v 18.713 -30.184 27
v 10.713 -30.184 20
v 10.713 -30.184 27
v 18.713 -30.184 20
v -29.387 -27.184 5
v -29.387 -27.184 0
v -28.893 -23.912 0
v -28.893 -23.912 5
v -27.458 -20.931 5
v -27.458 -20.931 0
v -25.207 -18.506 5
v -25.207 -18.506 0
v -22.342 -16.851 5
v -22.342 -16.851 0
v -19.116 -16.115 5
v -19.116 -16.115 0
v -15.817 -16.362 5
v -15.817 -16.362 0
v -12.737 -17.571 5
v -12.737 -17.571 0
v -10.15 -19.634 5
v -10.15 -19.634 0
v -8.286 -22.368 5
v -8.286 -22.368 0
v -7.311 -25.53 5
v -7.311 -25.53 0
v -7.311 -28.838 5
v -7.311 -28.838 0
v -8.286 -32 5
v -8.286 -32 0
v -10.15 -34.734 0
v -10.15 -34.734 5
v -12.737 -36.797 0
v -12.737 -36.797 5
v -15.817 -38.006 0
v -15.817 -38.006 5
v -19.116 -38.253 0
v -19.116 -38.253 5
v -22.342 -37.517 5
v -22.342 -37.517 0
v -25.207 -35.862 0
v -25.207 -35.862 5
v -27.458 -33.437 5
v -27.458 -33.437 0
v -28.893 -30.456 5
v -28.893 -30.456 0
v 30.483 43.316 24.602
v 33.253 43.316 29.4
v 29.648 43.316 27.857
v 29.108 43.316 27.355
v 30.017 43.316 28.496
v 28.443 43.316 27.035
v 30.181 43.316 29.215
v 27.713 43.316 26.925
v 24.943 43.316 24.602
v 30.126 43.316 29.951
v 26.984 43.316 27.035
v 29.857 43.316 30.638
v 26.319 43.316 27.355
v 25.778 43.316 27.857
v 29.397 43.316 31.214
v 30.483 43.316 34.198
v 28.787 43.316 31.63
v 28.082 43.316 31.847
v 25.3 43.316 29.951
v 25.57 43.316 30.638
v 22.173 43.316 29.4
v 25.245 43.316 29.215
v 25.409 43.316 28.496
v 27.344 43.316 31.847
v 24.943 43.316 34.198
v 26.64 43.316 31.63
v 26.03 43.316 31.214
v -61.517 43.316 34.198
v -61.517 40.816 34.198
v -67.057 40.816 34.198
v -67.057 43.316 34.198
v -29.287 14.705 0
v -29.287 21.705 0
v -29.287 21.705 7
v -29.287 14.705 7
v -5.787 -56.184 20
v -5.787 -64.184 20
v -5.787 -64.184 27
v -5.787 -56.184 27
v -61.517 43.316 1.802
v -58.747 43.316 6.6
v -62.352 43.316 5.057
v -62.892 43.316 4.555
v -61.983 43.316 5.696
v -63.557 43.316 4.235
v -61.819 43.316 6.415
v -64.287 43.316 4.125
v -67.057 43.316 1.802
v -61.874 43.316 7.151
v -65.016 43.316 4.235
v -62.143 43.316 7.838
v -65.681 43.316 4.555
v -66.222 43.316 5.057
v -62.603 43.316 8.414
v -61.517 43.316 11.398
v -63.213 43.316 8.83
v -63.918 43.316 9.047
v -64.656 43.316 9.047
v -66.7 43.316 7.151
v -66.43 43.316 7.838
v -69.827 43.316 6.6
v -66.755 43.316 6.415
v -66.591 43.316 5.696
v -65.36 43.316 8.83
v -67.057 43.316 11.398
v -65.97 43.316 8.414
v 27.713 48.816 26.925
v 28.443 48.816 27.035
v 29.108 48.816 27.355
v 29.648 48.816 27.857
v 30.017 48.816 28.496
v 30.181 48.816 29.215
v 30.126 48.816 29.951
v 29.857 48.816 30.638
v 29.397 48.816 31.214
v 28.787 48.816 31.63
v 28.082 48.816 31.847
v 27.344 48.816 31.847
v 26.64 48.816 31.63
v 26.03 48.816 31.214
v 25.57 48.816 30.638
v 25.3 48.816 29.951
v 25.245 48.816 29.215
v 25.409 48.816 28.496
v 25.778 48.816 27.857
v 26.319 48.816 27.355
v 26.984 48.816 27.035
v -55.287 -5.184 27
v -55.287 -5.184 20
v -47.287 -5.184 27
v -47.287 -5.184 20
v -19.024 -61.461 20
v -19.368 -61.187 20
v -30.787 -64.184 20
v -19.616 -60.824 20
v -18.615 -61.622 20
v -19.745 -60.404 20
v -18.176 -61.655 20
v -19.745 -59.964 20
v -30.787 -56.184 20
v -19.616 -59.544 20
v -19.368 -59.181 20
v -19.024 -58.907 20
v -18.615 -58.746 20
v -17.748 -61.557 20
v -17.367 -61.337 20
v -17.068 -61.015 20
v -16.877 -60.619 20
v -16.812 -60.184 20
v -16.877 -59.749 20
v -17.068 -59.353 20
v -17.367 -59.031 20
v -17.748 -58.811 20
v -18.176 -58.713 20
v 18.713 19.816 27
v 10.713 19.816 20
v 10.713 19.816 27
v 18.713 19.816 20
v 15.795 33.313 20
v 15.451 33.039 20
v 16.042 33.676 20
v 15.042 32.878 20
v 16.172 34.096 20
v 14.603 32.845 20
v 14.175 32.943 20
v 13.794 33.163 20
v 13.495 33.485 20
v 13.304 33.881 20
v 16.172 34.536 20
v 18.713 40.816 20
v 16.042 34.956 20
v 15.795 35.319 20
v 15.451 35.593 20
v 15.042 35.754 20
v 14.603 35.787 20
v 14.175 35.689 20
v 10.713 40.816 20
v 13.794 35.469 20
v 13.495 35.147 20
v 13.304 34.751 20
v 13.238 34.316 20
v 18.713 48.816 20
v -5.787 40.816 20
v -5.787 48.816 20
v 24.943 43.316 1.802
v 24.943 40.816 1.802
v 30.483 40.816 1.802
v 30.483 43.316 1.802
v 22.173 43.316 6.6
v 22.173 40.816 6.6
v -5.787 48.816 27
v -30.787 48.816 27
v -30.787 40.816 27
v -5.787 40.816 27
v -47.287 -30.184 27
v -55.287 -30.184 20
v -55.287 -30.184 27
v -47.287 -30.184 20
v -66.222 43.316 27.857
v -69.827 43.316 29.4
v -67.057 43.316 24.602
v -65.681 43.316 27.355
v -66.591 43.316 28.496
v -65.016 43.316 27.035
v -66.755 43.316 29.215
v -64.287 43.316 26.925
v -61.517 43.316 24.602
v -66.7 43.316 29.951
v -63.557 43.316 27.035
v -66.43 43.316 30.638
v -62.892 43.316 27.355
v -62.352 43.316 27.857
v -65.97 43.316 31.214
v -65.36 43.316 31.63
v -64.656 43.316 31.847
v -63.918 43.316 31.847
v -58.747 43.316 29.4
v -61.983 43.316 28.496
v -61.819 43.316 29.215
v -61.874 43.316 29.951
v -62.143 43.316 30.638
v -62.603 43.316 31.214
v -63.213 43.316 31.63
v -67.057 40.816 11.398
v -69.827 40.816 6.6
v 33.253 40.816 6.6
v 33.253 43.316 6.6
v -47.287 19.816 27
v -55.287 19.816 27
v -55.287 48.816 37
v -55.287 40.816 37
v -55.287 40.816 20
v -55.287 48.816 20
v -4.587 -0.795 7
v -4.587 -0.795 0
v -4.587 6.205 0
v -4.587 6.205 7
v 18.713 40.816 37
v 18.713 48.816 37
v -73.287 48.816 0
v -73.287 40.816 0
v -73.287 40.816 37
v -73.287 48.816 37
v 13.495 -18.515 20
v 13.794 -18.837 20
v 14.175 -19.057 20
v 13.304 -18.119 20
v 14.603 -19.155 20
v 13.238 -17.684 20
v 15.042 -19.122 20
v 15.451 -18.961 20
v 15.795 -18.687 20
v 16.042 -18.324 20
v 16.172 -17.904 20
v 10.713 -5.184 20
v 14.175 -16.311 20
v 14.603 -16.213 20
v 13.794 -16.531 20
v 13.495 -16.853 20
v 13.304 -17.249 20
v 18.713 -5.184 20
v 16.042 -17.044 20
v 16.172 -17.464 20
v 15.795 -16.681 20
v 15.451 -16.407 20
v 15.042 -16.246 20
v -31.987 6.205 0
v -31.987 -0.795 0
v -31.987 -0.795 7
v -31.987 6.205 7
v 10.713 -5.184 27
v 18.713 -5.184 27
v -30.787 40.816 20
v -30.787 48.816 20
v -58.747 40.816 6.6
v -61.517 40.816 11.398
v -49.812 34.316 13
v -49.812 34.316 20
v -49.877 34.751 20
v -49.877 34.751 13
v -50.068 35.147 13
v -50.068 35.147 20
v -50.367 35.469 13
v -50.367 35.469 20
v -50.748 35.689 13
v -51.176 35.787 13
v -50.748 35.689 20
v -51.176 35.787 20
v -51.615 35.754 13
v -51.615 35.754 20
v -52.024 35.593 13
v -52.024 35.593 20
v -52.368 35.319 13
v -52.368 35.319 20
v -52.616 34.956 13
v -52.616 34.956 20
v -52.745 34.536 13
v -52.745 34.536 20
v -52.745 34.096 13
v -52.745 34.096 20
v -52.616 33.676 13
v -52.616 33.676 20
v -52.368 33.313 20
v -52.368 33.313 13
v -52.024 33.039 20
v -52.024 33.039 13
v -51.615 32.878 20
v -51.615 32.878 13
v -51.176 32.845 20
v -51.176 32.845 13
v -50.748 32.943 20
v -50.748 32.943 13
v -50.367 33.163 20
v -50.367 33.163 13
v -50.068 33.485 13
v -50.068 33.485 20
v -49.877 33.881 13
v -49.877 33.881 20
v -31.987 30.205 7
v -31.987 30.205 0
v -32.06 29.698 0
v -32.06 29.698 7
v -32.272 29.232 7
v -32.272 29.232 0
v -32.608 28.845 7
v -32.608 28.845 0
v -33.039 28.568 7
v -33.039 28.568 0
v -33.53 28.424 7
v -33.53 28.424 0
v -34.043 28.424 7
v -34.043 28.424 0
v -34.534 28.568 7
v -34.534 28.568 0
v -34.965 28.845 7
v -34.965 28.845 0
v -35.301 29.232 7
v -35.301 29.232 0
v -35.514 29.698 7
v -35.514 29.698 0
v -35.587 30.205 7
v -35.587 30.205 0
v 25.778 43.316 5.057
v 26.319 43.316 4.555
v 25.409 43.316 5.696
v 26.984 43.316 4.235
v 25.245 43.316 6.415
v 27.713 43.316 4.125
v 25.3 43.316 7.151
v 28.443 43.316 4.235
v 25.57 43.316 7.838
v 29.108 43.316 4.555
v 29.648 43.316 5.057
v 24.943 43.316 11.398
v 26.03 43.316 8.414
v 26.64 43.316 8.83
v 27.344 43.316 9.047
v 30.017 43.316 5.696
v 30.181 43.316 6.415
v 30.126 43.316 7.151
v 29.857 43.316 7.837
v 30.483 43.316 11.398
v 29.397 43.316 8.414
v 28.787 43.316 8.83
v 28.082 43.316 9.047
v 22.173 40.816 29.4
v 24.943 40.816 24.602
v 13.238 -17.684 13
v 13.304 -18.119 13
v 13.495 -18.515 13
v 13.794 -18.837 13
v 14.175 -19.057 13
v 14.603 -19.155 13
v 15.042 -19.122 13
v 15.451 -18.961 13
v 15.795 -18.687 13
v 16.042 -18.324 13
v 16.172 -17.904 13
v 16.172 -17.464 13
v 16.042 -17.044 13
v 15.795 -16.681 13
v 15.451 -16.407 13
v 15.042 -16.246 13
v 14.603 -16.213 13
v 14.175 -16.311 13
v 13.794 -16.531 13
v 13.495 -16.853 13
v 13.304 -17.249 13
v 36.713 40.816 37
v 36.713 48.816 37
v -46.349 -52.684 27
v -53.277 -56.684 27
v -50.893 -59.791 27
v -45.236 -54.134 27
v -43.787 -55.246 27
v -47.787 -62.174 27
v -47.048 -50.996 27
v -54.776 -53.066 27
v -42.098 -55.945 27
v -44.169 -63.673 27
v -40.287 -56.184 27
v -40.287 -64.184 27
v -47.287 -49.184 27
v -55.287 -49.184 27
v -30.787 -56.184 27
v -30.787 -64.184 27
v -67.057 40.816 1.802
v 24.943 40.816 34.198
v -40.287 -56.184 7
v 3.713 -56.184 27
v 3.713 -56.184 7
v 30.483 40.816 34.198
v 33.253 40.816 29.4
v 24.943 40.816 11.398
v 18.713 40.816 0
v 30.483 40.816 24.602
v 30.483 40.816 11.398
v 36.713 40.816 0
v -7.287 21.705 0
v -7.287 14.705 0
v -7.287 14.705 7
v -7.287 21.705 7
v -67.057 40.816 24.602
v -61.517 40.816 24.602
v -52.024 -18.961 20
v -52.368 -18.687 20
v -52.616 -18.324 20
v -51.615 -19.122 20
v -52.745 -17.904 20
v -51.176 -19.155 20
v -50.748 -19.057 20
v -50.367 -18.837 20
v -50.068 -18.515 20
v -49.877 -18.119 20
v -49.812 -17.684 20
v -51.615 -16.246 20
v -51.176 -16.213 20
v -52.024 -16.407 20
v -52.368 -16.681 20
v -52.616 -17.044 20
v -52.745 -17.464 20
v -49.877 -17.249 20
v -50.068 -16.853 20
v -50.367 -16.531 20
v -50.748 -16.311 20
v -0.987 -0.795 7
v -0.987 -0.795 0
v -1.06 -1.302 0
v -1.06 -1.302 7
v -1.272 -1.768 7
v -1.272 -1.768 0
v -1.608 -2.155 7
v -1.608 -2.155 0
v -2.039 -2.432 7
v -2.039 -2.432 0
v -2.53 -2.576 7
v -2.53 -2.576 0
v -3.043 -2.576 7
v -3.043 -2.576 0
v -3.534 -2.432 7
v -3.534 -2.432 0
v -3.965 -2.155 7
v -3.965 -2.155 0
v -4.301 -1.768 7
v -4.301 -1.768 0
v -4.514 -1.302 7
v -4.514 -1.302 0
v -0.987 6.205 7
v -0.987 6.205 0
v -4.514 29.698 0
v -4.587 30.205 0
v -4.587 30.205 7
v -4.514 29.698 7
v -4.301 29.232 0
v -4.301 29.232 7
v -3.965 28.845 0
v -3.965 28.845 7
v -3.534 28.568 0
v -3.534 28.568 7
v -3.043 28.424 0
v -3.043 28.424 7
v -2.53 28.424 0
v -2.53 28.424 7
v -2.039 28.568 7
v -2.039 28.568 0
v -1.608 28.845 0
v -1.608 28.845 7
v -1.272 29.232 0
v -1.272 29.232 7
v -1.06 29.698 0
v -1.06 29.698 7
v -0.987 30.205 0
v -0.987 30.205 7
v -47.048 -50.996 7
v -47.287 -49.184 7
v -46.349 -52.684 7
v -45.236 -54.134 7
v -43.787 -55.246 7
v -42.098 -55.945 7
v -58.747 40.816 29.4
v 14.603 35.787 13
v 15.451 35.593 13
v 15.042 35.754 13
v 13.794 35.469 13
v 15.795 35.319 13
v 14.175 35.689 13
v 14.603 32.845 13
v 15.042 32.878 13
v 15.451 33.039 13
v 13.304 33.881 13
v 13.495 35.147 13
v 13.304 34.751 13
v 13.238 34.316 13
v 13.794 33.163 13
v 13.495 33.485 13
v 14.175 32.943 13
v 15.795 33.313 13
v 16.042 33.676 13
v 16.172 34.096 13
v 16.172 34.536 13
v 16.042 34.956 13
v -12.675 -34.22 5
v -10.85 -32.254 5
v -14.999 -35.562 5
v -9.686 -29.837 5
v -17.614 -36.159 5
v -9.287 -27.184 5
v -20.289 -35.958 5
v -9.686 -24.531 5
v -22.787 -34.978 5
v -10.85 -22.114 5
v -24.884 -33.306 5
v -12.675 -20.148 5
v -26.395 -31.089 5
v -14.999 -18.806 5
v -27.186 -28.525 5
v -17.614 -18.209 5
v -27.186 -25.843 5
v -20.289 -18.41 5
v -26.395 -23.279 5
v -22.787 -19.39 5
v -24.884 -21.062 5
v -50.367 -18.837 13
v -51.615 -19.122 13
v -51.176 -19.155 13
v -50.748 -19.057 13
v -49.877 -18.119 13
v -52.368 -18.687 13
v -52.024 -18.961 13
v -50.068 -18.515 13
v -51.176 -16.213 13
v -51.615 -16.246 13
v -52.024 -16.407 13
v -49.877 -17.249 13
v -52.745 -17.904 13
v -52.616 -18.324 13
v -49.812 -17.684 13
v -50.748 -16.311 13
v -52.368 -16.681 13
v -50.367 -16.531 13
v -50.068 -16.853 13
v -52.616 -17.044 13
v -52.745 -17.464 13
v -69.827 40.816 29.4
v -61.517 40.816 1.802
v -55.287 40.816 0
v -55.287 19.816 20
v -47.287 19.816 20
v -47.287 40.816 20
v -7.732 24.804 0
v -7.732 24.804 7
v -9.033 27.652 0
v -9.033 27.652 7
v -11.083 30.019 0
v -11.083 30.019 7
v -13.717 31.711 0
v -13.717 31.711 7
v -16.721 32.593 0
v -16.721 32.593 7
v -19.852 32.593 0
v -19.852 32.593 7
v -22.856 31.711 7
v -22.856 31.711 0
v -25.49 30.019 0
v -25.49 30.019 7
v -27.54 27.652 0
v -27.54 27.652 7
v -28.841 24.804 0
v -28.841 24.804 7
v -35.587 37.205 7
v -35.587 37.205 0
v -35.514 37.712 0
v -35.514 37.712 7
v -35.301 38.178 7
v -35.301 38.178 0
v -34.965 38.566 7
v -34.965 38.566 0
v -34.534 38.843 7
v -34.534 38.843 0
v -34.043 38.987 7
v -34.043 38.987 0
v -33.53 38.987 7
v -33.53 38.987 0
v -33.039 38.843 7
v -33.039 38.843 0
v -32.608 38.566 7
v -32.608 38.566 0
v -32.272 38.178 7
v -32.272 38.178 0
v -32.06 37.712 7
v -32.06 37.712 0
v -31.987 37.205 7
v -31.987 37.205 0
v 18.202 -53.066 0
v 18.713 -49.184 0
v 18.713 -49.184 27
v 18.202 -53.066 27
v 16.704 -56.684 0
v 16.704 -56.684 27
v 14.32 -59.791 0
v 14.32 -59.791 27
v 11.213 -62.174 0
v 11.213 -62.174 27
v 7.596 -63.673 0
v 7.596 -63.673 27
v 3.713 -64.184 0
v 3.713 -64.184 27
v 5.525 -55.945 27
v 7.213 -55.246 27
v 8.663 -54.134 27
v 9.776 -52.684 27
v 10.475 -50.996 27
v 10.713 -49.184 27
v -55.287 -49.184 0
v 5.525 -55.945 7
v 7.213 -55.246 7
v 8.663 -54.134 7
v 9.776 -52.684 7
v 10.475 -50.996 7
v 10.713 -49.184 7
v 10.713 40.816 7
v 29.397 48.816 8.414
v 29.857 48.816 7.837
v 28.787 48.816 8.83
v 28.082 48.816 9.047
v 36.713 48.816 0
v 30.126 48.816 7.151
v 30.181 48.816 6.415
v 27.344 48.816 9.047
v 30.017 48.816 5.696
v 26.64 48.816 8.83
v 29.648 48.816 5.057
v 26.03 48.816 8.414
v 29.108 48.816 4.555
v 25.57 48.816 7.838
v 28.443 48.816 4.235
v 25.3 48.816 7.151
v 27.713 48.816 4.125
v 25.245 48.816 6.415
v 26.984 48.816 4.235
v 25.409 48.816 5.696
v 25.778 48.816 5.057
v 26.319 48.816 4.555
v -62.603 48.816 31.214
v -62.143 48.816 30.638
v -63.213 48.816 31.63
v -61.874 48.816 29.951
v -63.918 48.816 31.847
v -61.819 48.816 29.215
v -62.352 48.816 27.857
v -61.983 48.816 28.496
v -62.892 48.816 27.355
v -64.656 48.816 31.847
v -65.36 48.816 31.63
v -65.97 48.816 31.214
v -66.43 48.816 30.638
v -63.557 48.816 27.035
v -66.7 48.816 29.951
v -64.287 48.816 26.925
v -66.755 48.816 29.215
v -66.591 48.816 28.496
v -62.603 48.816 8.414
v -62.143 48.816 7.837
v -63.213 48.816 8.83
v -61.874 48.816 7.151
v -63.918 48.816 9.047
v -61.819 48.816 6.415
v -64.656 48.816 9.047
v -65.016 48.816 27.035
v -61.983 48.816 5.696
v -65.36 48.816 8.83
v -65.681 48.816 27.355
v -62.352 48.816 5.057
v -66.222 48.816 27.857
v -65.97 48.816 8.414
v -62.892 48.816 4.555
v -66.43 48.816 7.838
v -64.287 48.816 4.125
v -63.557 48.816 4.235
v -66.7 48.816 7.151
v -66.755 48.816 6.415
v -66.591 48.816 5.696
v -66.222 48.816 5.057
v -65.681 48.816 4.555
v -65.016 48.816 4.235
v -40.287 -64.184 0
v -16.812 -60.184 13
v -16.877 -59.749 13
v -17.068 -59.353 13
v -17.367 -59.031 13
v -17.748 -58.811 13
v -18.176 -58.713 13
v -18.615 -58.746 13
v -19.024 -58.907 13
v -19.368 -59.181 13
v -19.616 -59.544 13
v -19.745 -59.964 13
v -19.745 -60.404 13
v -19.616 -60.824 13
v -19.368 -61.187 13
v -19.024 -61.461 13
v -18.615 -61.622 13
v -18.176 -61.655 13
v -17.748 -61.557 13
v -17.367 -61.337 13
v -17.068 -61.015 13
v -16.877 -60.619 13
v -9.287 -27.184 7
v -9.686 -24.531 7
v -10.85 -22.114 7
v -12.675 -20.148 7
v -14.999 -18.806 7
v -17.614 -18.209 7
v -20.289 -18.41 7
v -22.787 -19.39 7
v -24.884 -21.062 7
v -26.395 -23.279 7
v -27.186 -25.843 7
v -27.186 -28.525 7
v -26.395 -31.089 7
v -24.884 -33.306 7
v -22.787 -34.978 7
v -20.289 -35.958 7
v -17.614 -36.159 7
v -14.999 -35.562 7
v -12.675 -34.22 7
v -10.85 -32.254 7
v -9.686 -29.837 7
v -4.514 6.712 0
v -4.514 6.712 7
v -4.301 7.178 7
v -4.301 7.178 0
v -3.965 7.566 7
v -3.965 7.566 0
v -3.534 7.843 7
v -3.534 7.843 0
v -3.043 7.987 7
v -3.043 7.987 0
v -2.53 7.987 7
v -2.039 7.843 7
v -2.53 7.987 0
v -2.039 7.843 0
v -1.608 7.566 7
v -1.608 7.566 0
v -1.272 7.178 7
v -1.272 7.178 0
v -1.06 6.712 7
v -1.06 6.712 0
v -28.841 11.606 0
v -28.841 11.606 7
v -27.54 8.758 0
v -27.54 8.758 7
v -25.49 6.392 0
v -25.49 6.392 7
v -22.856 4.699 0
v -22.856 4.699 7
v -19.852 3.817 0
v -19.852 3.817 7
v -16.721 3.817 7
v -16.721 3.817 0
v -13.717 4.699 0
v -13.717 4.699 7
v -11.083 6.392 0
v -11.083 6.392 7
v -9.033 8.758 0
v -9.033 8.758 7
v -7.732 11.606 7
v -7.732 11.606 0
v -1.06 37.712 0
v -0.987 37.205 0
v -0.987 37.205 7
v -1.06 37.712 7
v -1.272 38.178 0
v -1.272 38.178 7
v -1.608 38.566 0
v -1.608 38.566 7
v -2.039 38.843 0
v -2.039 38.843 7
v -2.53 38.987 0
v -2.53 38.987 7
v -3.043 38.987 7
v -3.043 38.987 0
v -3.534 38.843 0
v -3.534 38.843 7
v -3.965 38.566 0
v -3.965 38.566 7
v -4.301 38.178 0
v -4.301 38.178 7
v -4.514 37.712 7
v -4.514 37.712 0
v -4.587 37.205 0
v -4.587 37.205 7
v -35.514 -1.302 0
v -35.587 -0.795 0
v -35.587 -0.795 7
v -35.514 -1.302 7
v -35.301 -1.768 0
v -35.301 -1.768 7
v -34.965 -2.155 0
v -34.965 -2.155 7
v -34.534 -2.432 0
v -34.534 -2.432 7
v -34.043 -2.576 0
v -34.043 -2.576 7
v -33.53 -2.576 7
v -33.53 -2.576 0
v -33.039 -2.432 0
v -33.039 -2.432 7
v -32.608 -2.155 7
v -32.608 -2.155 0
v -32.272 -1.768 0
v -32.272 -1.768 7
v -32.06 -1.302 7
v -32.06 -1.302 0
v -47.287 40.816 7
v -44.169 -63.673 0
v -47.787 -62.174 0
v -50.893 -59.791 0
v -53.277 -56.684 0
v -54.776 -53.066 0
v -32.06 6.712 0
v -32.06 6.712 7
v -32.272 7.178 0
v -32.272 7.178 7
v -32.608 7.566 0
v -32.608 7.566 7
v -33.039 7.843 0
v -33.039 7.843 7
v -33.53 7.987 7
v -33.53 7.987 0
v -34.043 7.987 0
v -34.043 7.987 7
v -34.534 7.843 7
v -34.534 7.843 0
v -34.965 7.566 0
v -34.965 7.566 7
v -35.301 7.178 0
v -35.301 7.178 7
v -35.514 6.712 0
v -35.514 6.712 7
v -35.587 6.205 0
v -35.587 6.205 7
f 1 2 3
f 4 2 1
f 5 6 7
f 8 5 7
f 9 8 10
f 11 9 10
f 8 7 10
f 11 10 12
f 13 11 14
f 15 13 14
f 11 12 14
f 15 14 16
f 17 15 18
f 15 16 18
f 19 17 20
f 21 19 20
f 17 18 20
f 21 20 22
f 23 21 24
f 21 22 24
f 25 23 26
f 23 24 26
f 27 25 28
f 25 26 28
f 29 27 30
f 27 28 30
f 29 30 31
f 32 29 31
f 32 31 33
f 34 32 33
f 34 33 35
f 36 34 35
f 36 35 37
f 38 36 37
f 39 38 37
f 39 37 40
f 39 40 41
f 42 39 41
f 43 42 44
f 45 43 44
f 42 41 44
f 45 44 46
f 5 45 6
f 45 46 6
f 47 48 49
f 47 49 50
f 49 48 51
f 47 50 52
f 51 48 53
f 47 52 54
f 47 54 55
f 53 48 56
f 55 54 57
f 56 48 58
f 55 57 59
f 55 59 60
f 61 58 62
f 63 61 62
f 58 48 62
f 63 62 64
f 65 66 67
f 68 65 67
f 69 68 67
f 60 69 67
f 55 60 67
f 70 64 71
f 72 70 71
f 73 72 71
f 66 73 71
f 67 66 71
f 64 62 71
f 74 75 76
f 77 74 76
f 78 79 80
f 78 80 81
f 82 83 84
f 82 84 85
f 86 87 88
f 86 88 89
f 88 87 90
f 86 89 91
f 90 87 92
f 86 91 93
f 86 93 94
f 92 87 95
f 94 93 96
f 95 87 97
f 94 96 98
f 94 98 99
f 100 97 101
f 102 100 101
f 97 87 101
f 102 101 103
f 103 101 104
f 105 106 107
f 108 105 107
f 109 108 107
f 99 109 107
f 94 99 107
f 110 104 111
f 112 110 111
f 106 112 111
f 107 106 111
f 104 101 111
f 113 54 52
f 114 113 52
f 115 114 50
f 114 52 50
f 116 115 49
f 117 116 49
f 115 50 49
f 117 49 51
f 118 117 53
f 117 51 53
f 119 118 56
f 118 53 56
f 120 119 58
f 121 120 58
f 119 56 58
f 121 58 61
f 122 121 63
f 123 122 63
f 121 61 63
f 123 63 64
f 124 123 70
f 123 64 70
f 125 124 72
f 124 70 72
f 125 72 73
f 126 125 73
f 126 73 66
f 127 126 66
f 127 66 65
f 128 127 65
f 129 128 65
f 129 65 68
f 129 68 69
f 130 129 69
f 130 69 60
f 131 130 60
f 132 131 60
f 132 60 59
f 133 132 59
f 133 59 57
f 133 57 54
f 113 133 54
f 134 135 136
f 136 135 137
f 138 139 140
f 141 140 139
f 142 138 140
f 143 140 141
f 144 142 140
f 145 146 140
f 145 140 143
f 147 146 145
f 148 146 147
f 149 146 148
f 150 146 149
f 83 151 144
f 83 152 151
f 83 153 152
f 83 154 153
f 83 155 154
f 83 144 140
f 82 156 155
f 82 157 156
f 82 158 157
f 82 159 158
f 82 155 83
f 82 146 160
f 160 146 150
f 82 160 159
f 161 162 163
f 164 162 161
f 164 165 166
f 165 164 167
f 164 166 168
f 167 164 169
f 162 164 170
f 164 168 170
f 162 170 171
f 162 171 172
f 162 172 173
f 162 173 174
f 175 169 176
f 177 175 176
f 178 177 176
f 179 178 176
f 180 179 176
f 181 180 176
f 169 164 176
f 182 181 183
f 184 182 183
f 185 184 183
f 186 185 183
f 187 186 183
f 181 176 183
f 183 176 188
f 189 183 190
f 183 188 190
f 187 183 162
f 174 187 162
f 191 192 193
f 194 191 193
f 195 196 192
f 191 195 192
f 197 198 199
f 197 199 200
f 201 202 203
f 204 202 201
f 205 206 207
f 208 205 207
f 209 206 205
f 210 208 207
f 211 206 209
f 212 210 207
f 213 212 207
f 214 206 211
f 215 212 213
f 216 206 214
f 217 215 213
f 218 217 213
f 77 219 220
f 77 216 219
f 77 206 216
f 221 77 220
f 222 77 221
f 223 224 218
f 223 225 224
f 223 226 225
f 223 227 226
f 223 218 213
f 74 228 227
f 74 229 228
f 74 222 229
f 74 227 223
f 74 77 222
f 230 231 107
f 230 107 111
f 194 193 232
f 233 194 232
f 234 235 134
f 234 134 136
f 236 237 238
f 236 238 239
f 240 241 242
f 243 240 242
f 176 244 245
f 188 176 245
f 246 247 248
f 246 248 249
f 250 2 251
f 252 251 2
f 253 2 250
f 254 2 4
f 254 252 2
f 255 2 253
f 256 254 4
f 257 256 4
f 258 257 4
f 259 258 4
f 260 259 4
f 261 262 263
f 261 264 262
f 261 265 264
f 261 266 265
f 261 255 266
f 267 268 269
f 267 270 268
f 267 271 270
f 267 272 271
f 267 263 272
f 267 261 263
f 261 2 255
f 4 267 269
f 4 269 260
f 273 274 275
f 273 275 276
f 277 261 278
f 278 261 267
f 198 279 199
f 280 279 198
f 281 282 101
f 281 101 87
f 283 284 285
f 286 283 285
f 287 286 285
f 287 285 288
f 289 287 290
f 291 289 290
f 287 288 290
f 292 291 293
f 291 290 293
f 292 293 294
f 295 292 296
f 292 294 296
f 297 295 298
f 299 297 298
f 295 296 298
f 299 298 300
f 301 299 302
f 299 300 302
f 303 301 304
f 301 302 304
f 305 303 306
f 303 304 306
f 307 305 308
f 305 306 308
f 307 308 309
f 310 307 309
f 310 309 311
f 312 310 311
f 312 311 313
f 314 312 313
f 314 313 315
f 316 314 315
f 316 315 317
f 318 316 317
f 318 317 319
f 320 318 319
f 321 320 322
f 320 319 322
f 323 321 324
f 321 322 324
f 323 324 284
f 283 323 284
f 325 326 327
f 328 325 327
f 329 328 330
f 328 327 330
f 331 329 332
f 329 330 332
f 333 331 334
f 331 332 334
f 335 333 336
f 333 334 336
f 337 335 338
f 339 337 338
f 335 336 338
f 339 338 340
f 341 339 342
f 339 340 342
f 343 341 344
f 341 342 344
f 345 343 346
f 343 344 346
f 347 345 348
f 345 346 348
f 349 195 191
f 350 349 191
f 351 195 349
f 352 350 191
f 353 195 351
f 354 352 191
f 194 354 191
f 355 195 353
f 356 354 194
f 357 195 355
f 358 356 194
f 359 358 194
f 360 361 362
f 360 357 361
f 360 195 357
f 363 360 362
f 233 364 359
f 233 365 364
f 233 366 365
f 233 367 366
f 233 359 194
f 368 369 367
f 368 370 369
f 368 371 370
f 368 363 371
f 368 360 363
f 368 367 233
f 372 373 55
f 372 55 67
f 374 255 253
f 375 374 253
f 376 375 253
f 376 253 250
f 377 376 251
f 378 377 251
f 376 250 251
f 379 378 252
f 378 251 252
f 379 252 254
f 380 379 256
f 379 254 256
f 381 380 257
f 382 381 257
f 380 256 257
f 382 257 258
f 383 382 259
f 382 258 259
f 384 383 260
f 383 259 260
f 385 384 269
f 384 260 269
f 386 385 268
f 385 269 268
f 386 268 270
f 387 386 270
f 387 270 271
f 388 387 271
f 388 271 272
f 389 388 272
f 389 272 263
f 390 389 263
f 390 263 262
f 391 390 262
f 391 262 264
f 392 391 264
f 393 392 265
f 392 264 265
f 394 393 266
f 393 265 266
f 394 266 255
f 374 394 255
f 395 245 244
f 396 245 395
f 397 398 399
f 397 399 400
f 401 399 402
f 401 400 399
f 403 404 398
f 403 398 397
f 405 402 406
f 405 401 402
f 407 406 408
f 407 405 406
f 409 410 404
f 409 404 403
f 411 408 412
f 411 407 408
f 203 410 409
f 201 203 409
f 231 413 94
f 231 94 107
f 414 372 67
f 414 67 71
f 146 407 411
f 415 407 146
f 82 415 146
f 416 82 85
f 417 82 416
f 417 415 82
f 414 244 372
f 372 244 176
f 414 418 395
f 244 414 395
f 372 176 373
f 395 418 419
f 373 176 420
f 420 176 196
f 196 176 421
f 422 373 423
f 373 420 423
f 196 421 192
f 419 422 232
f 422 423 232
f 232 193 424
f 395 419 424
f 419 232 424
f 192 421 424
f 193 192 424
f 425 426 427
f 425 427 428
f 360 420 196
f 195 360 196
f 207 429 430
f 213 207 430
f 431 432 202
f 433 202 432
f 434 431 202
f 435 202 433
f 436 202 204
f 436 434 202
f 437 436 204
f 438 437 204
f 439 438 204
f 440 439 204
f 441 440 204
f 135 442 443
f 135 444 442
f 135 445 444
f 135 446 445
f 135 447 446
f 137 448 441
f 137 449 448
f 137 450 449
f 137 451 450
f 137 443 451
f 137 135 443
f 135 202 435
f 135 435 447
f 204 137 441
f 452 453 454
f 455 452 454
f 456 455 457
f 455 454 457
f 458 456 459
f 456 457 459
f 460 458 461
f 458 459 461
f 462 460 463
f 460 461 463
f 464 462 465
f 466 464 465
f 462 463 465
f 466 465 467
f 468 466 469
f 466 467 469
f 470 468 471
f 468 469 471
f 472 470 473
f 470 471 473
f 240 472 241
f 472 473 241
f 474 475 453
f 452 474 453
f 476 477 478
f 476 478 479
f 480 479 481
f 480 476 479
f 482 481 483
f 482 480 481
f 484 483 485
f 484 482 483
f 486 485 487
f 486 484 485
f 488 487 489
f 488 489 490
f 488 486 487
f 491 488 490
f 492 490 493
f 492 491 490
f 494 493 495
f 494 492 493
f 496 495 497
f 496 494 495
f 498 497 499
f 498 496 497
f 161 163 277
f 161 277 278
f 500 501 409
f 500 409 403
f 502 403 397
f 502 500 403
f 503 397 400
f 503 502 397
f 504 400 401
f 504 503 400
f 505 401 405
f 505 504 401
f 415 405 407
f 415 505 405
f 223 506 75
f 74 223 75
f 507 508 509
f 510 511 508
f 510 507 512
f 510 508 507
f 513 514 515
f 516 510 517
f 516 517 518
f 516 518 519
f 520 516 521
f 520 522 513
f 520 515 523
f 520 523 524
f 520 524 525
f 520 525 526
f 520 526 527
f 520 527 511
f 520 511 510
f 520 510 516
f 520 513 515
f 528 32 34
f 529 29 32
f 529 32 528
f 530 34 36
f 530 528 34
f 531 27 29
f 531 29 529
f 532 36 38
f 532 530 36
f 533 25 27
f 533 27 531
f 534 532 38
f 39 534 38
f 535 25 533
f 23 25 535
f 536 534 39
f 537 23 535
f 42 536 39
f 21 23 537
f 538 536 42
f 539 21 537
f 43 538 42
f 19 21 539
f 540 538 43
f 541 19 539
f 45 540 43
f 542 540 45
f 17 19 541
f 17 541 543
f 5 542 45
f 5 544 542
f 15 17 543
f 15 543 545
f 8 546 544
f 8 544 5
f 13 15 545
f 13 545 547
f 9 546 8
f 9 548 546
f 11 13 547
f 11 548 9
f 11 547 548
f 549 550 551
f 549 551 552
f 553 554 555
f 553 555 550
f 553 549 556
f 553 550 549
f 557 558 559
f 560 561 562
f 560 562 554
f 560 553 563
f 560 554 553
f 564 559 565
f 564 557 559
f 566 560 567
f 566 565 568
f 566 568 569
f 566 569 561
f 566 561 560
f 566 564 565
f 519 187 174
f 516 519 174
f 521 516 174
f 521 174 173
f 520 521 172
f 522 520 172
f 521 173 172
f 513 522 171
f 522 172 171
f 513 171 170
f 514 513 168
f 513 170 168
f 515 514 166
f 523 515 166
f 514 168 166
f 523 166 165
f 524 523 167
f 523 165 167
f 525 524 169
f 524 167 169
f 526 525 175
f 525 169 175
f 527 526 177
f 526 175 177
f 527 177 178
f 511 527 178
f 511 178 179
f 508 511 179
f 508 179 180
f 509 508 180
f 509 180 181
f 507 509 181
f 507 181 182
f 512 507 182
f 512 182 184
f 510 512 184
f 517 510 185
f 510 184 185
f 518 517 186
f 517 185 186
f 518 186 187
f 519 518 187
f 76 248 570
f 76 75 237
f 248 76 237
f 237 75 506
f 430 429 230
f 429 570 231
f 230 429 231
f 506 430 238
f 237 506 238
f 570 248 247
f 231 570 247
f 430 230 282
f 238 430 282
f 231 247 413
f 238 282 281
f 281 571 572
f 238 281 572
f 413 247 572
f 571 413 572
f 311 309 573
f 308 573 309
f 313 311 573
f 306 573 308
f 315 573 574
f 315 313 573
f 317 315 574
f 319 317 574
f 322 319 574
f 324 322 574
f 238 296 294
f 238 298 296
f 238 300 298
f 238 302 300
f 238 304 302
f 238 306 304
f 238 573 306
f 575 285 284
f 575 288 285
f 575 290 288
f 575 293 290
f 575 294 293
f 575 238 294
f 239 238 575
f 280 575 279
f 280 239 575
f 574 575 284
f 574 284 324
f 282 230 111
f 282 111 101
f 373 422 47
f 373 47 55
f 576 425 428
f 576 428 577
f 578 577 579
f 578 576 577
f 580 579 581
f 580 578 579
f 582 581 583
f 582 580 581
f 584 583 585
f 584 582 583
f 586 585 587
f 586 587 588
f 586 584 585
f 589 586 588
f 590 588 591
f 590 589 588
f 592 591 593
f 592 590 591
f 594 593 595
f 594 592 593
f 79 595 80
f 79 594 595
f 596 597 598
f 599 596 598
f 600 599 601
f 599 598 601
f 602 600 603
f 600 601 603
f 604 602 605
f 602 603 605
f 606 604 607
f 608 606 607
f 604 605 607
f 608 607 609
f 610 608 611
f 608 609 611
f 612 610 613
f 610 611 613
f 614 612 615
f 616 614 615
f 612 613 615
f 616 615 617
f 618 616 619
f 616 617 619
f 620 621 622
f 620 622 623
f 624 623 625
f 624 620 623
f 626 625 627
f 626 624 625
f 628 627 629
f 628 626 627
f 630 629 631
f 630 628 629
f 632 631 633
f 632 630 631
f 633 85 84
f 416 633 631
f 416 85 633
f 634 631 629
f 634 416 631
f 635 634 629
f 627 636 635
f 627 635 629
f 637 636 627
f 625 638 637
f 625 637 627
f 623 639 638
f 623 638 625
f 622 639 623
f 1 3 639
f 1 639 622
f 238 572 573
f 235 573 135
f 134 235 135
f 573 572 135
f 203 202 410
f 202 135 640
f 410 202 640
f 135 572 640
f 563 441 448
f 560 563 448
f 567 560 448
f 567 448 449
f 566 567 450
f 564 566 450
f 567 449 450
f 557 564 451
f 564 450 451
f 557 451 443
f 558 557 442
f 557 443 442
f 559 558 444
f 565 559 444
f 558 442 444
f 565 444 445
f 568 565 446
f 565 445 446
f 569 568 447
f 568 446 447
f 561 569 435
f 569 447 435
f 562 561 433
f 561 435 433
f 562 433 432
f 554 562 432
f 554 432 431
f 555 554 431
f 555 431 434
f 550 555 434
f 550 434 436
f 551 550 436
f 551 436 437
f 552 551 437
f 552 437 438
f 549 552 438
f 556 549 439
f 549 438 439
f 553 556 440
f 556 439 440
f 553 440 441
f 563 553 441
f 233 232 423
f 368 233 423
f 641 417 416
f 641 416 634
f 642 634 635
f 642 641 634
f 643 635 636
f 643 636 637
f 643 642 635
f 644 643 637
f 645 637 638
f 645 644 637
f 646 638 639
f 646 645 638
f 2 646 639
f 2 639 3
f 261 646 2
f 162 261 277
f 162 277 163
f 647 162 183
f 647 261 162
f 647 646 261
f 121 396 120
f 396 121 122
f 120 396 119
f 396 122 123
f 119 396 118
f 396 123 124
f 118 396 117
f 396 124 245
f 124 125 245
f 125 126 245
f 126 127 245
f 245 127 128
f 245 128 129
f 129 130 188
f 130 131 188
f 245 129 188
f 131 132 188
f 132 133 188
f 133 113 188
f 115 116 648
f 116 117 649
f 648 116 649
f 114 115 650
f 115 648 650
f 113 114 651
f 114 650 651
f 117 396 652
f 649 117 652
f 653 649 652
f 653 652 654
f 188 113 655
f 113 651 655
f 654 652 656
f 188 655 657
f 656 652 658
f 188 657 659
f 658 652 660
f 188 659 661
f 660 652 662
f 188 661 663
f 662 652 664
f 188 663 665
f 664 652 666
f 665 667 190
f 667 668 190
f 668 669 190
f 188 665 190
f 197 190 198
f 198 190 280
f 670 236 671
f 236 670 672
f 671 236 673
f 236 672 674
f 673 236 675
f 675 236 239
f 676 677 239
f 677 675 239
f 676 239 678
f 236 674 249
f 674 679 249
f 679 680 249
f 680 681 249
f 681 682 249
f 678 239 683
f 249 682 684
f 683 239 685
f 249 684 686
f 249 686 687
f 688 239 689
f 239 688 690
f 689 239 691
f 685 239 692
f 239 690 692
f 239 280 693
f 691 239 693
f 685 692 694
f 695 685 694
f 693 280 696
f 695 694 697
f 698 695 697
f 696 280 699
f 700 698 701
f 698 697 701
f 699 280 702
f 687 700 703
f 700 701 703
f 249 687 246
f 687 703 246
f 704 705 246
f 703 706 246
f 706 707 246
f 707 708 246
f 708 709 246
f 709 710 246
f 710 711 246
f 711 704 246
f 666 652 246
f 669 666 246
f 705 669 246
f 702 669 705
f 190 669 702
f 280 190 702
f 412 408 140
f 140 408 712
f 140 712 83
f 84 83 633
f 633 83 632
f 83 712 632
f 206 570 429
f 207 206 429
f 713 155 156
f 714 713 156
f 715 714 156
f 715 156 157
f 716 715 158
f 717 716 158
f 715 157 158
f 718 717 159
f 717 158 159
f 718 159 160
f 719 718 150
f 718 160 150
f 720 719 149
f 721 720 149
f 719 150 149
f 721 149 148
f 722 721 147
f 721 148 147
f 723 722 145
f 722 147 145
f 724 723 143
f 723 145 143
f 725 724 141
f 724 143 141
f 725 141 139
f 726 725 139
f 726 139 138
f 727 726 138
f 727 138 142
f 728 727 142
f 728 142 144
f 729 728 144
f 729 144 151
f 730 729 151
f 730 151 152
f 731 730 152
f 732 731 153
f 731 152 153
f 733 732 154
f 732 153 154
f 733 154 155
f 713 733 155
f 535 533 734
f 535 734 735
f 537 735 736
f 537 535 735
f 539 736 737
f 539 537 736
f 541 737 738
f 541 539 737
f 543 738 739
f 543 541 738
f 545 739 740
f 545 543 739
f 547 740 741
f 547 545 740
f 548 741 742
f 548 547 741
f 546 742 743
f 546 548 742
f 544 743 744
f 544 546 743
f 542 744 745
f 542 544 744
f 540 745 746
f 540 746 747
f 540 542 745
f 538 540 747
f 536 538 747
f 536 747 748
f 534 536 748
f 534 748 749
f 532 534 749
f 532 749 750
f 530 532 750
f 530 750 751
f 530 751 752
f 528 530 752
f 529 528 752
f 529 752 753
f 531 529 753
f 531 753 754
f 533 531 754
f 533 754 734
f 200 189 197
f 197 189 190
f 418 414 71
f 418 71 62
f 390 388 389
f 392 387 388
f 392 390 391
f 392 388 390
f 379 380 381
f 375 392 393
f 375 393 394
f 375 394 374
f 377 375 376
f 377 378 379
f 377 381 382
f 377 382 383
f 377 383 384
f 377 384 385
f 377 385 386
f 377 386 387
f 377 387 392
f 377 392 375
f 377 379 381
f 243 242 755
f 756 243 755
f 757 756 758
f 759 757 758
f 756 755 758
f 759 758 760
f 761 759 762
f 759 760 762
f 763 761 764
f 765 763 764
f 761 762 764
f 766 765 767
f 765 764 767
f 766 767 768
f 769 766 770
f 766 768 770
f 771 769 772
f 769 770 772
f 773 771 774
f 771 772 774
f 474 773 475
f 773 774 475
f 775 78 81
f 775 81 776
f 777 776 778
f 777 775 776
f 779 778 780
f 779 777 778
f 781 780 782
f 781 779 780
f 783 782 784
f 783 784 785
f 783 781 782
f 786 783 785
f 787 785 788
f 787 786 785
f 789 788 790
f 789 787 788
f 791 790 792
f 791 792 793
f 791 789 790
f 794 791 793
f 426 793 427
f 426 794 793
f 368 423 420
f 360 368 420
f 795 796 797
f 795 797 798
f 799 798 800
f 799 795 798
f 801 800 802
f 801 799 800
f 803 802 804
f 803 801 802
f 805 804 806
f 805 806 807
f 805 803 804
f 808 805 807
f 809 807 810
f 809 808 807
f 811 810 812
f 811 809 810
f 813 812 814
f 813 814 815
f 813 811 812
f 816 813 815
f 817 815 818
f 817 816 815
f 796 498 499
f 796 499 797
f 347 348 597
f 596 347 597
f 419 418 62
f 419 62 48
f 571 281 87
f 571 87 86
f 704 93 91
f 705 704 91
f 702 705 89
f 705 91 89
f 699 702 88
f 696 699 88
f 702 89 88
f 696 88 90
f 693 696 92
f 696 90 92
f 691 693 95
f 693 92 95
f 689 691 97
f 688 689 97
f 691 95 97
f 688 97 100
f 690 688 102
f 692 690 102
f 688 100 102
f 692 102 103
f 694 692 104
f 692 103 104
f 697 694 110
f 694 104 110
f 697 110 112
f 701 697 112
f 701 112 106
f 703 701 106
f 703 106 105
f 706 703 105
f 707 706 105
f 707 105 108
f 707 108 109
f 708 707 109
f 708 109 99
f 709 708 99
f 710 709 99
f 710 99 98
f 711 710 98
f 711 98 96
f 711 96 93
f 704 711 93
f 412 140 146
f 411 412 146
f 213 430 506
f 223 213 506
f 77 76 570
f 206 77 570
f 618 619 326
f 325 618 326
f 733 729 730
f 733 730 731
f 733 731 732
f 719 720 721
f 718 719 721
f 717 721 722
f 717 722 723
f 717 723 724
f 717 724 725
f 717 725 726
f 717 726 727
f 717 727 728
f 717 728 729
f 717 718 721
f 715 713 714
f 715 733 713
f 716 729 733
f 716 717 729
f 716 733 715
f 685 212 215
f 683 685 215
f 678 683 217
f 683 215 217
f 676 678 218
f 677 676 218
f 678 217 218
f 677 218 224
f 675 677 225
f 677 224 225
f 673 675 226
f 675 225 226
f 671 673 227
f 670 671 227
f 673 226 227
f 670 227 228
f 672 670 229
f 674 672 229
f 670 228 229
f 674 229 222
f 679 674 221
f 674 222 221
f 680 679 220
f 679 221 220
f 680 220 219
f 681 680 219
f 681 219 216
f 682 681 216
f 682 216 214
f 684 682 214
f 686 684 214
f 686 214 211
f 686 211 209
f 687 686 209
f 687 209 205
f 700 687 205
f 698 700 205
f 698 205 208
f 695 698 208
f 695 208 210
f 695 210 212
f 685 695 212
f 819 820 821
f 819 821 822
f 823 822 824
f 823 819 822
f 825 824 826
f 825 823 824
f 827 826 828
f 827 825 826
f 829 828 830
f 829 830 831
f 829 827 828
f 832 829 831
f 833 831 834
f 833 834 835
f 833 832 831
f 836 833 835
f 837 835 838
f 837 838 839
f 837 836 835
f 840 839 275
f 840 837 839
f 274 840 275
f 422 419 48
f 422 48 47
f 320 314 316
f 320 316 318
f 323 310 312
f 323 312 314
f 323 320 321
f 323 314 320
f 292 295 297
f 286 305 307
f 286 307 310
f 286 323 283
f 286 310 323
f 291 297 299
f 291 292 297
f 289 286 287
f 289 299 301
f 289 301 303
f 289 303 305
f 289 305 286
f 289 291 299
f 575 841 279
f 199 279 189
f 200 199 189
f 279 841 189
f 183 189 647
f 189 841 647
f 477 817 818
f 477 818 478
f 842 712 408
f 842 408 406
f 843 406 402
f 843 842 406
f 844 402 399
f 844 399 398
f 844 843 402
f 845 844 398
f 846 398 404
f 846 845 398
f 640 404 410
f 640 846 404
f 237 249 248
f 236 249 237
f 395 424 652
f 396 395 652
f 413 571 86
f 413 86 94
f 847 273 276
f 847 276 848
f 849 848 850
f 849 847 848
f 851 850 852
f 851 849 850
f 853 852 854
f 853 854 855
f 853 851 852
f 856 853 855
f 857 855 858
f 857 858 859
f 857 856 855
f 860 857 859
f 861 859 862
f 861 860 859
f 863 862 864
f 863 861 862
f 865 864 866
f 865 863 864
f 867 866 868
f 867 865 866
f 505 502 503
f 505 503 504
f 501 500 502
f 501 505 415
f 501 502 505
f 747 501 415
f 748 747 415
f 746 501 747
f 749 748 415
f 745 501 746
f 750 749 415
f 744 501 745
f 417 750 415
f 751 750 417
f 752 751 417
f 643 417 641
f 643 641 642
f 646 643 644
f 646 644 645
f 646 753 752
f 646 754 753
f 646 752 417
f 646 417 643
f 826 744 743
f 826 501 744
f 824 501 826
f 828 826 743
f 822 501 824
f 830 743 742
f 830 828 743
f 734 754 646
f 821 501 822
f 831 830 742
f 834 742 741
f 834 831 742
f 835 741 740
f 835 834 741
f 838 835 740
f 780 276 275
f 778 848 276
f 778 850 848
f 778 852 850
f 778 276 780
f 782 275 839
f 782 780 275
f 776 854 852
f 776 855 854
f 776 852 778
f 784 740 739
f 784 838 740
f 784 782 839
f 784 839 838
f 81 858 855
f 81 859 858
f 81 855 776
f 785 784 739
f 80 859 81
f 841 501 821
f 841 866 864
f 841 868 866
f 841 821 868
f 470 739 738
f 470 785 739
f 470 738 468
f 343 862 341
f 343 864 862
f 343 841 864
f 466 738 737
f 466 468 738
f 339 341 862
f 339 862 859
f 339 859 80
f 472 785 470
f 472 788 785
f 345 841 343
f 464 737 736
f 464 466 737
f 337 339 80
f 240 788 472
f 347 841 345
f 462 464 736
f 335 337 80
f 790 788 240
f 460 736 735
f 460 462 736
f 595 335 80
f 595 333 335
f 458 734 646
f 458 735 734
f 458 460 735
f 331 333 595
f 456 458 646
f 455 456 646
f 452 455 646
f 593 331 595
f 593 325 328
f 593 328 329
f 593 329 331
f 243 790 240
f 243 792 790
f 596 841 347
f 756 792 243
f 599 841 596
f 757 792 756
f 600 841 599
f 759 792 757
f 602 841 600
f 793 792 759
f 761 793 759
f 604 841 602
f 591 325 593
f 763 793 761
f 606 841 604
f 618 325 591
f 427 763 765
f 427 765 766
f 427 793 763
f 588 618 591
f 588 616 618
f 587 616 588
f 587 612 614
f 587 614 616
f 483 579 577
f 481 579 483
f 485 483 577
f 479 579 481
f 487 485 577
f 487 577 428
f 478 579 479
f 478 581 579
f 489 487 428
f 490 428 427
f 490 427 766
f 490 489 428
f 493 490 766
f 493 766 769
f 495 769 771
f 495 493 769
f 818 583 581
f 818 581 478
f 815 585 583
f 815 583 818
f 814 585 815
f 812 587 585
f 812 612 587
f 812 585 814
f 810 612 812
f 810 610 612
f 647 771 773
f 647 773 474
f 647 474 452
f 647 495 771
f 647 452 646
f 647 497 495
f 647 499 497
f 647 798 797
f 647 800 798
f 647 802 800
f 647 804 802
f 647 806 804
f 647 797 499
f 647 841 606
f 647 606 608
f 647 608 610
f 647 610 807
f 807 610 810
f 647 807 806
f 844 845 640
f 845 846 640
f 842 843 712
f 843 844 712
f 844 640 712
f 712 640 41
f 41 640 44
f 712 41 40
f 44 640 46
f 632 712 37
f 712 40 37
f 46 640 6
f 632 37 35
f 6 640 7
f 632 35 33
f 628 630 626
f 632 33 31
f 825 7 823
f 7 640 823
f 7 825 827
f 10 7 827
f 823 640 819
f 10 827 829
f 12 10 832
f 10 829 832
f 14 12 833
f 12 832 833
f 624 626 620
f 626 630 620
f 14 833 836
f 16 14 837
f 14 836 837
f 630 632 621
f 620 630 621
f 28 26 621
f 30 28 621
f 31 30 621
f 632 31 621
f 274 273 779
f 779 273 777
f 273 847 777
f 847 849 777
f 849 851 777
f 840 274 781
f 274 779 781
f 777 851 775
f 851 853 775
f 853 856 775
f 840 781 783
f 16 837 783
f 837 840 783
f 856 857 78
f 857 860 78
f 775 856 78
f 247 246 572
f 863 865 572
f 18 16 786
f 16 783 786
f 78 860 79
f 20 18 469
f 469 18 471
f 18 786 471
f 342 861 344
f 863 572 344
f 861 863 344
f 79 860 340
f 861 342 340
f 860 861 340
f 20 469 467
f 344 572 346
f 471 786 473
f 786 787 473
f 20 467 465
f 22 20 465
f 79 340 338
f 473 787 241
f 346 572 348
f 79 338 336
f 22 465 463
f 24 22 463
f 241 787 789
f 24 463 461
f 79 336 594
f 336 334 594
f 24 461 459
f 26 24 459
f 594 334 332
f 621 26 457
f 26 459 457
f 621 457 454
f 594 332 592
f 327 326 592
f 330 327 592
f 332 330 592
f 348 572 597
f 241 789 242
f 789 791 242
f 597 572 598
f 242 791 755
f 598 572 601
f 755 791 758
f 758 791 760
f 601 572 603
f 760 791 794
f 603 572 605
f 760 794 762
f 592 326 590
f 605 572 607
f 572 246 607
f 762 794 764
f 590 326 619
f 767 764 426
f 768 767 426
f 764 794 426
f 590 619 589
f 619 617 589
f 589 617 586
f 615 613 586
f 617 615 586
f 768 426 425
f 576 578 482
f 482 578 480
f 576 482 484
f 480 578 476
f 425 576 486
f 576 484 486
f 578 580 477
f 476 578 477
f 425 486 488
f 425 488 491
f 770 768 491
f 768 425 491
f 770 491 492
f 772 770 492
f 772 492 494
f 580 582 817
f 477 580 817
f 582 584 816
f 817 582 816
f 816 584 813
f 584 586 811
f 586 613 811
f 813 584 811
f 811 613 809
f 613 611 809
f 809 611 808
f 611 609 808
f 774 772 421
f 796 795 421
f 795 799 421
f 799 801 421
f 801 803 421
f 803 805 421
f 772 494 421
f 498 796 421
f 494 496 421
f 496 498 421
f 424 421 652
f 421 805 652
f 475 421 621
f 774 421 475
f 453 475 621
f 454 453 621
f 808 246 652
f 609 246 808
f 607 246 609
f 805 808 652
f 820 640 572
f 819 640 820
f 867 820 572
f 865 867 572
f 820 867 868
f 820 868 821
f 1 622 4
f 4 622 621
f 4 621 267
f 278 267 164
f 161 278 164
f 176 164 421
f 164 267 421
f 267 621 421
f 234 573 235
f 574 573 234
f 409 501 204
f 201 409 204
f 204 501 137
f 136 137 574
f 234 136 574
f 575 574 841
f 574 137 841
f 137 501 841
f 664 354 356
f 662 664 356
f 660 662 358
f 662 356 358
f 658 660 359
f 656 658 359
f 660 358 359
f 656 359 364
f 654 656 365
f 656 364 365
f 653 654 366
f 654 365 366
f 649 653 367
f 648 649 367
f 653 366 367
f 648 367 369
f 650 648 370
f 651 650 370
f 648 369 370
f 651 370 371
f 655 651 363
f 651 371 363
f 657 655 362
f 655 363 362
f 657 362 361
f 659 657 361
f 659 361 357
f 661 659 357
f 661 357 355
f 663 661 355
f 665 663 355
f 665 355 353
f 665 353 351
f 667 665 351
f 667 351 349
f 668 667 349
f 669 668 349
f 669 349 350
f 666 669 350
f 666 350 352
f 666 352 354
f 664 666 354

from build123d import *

# Parameters (mm, degrees)
CROQUIS2_R                = 9
SALIENTE_EXTRUIR1_DEPTH   = 7
CROQUIS2_5_W              = 18
CROQUIS2_5_H              = 8
SALIENTE_EXTRUIR2_DEPTH   = 37
SALIENTE_EXTRUIR2_2_DEPTH = 37
CROQUIS2_7_W              = 25
CROQUIS2_7_H              = 8
CROQUIS2_7_W_2            = 8
CROQUIS2_7_H_2            = 25
SALIENTE_EXTRUIR3_DEPTH   = 27
CROQUIS2_8_W              = 8
CROQUIS2_8_H              = 25
CROQUIS2_8_W_2            = 25
CROQUIS2_8_H_2            = 8
SALIENTE_EXTRUIR4_DEPTH   = 20
CROQUIS3_R                = 11.1
CORTAR_EXTRUIR1_DEPTH     = 5
CROQUIS9_R                = 2.475
CORTAR_EXTRUIR2_DEPTH     = 2.5
CROQUIS10_R               = 2.475
CORTAR_EXTRUIR3_DEPTH     = 8
CROQUIS11_R               = 1.475
CORTAR_EXTRUIR4_DEPTH     = 7


with BuildPart() as part:
    # Croquis2 → Saliente-Extruir1 (new body)
    with BuildSketch(Plane.XY):
        with BuildLine():
            Line((-5.786620614, 40.816010109), (-30.786620614, 40.816010109))
            Line((-30.786620614, 40.816010109), (-47.286620614, 40.816010109))
            Line((-47.286620614, 40.816010109), (-47.286620614, 19.816010109))
            Line((-47.286620614, 19.816010109), (-47.286620614, -5.183989891))
            Line((-47.286620614, -5.183989891), (-47.286620614, -30.183989891))
            Line((-47.286620614, -30.183989891), (-47.286620614, -49.183989891))
            ThreePointArc((-47.286620614, -49.183989891), (-45.236368082, -54.133737359), (-40.286620614, -56.183989891))
            Line((-40.286620614, -56.183989891), (-30.786620614, -56.183989891))
            Line((-30.786620614, -56.183989891), (-5.786620614, -56.183989891))
            Line((-5.786620614, -56.183989891), (3.713379386, -56.183989891))
            ThreePointArc((3.713379386, -56.183989891), (8.663126854, -54.133737359), (10.713379386, -49.183989891))
            Line((10.713379386, -49.183989891), (10.713379386, -30.183989891))
            Line((10.713379386, -30.183989891), (10.713379386, -5.183989891))
            Line((10.713379386, -5.183989891), (10.713379386, 19.816010109))
            Line((10.713379386, 19.816010109), (10.713379386, 40.816010109))
            Line((10.713379386, 40.816010109), (-5.786620614, 40.816010109))
        make_face()
        with Locations((-18.286620614, -27.183989891)):
            Circle(CROQUIS2_R, mode=Mode.SUBTRACT)
        with BuildLine():
            ThreePointArc((-35.586620614, 6.205288522), (-33.786620614, 8.005288522), (-31.986620614, 6.205288522))
            Line((-31.986620614, 6.205288522), (-31.986620614, -0.794711478))
            ThreePointArc((-31.986620614, -0.794711478), (-33.786620614, -2.594711478), (-35.586620614, -0.794711478))
            Line((-35.586620614, -0.794711478), (-35.586620614, 6.205288522))
        make_face(mode=Mode.SUBTRACT)
        with BuildLine():
            ThreePointArc((-29.286620614, 21.705288522), (-18.286620614, 32.705288522), (-7.286620614, 21.705288522))
            Line((-7.286620614, 21.705288522), (-7.286620614, 14.705288522))
            ThreePointArc((-7.286620614, 14.705288522), (-18.286620614, 3.705288522), (-29.286620614, 14.705288522))
            Line((-29.286620614, 14.705288522), (-29.286620614, 21.705288522))
        make_face(mode=Mode.SUBTRACT)
        with BuildLine():
            ThreePointArc((-31.986620614, 30.205288522), (-33.786620614, 28.405288522), (-35.586620614, 30.205288522))
            Line((-35.586620614, 30.205288522), (-35.586620614, 37.205288522))
            ThreePointArc((-35.586620614, 37.205288522), (-33.786620614, 39.005288522), (-31.986620614, 37.205288522))
            Line((-31.986620614, 37.205288522), (-31.986620614, 30.205288522))
        make_face(mode=Mode.SUBTRACT)
        with BuildLine():
            ThreePointArc((-4.586620614, 6.205288522), (-2.786620614, 8.005288522), (-0.986620614, 6.205288522))
            Line((-0.986620614, 6.205288522), (-0.986620614, -0.794711478))
            ThreePointArc((-0.986620614, -0.794711478), (-2.786620614, -2.594711478), (-4.586620614, -0.794711478))
            Line((-4.586620614, -0.794711478), (-4.586620614, 6.205288522))
        make_face(mode=Mode.SUBTRACT)
        with BuildLine():
            ThreePointArc((-0.986620614, 30.205288522), (-2.786620614, 28.405288522), (-4.586620614, 30.205288522))
            Line((-4.586620614, 30.205288522), (-4.586620614, 37.205288522))
            ThreePointArc((-4.586620614, 37.205288522), (-2.786620614, 39.005288522), (-0.986620614, 37.205288522))
            Line((-0.986620614, 37.205288522), (-0.986620614, 30.205288522))
        make_face(mode=Mode.SUBTRACT)
    extrude(amount=SALIENTE_EXTRUIR1_DEPTH)

    # Croquis2<7> → Saliente-Extruir3 (add)
    with BuildSketch(Plane.XY):
        with Locations((-18.286620614, 44.816010109)):
            Rectangle(CROQUIS2_7_W, CROQUIS2_7_H)
        with Locations((-51.286620614, 7.316010109)):
            Rectangle(CROQUIS2_7_W_2, CROQUIS2_7_H_2)
        with Locations((14.713379386, 7.316010109)):
            Rectangle(CROQUIS2_7_W_2, CROQUIS2_7_H_2)
        with BuildLine():
            Line((-47.286620614, -49.183989891), (-47.286620614, -30.183989891))
            Line((-47.286620614, -30.183989891), (-55.286620614, -30.183989891))
            Line((-55.286620614, -30.183989891), (-55.286620614, -49.183989891))
            ThreePointArc((-55.286620614, -49.183989891), (-50.893222332, -59.790591609), (-40.286620614, -64.183989891))
            Line((-40.286620614, -64.183989891), (-30.786620614, -64.183989891))
            Line((-30.786620614, -64.183989891), (-30.786620614, -56.183989891))
            Line((-30.786620614, -56.183989891), (-40.286620614, -56.183989891))
            ThreePointArc((-40.286620614, -56.183989891), (-45.236368082, -54.133737359), (-47.286620614, -49.183989891))
        make_face()
        with BuildLine():
            Line((18.713379386, -30.183989891), (10.713379386, -30.183989891))
            Line((10.713379386, -30.183989891), (10.713379386, -49.183989891))
            ThreePointArc((10.713379386, -49.183989891), (8.663126854, -54.133737359), (3.713379386, -56.183989891))
            Line((3.713379386, -56.183989891), (-5.786620614, -56.183989891))
            Line((-5.786620614, -56.183989891), (-5.786620614, -64.183989891))
            Line((-5.786620614, -64.183989891), (3.713379386, -64.183989891))
            ThreePointArc((3.713379386, -64.183989891), (14.319981104, -59.790591609), (18.713379386, -49.183989891))
            Line((18.713379386, -49.183989891), (18.713379386, -30.183989891))
        make_face()
    extrude(amount=SALIENTE_EXTRUIR3_DEPTH)



with BuildPart() as body_2:
    # Croquis2<5> → Saliente-Extruir2 (new body)
    with BuildSketch(Plane.XY):
        with Locations((-64.286620614, 44.816010109)):
            Rectangle(CROQUIS2_5_W, CROQUIS2_5_H)
    extrude(amount=SALIENTE_EXTRUIR2_DEPTH)


with BuildPart() as body_3:
    # Croquis2<5> → Saliente-Extruir2 2 (new body)
    with BuildSketch(Plane.XY):
        with Locations((27.713379386, 44.816010109)):
            Rectangle(CROQUIS2_5_W, CROQUIS2_5_H)
    extrude(amount=SALIENTE_EXTRUIR2_2_DEPTH)


with BuildPart() as part_1:
    add(part.part)

    add(body_2.part)  # Saliente-Extruir4 merges body 2

    add(body_3.part)  # Saliente-Extruir4 merges body 3
    # Croquis2<8> → Saliente-Extruir4 (add)
    with BuildSketch(Plane.XY):
        Polygon((-30.786620614, 40.816010109), (-30.786620614, 48.816010109), (-55.286620614, 48.816010109), (-55.286620614, 19.816010109), (-47.286620614, 19.816010109), (-47.286620614, 40.816010109), align=None)
        Polygon((18.713379386, 48.816010109), (-5.786620614, 48.816010109), (-5.786620614, 40.816010109), (10.713379386, 40.816010109), (10.713379386, 19.816010109), (18.713379386, 19.816010109), align=None)
        with Locations((-51.286620614, -17.683989891)):
            Rectangle(CROQUIS2_8_W, CROQUIS2_8_H)
        with Locations((14.713379386, -17.683989891)):
            Rectangle(CROQUIS2_8_W, CROQUIS2_8_H)
        with Locations((-18.286620614, -60.183989891)):
            Rectangle(CROQUIS2_8_W_2, CROQUIS2_8_H_2)
    extrude(amount=SALIENTE_EXTRUIR4_DEPTH)

    # Croquis3 → Cortar-Extruir1 (cut)
    with BuildSketch(Plane(origin=(0, 0, 0), x_dir=(-1, 0, 0), z_dir=(0, 0, -1))):
        with Locations((18.286620614, -27.183989891)):
            Circle(CROQUIS3_R)
    extrude(amount=-CORTAR_EXTRUIR1_DEPTH, mode=Mode.SUBTRACT)

    # Croquis9 → Cortar-Extruir2 (cut)
    # profile 1 of 4: a face of its own
    with BuildSketch(Plane.XZ.offset(-40.816010109)):
        Polygon((-69.826620614, 29.4), (-67.056620614, 24.602219263), (-61.516620614, 24.602219263), (-58.746620614, 29.4), (-61.516620614, 34.197780737), (-67.056620614, 34.197780737), align=None)
        with Locations((-64.286620614, 29.4)):
            Circle(CROQUIS9_R, mode=Mode.SUBTRACT)
    # profile 2 of 4: a face of its own
    with BuildSketch(Plane.XZ.offset(-40.816010109)):
        Polygon((33.253379386, 6.6), (30.483379386, 11.397780737), (24.943379386, 11.397780737), (22.173379386, 6.6), (24.943379386, 1.802219263), (30.483379386, 1.802219263), align=None)
        with Locations((27.713379386, 6.6)):
            Circle(CROQUIS9_R, mode=Mode.SUBTRACT)
    # profile 3 of 4: a face of its own
    with BuildSketch(Plane.XZ.offset(-40.816010109)):
        Polygon((30.483379386, 34.197780737), (33.253379386, 29.4), (30.483379386, 24.602219263), (24.943379386, 24.602219263), (22.173379386, 29.4), (24.943379386, 34.197780737), align=None)
        with Locations((27.713379386, 29.4)):
            Circle(CROQUIS9_R, mode=Mode.SUBTRACT)
    # profile 4 of 4: a face of its own
    with BuildSketch(Plane.XZ.offset(-40.816010109)):
        Polygon((-67.056620614, 1.802219263), (-69.826620614, 6.6), (-67.056620614, 11.397780737), (-61.516620614, 11.397780737), (-58.746620614, 6.6), (-61.516620614, 1.802219263), align=None)
        with Locations((-64.286620614, 6.6)):
            Circle(CROQUIS9_R, mode=Mode.SUBTRACT)
    extrude(amount=-CORTAR_EXTRUIR2_DEPTH, mode=Mode.SUBTRACT)

    # Croquis10 → Cortar-Extruir3 (cut)
    with BuildSketch(Plane.XZ.offset(-40.816010109)):
        with Locations((-64.286620614, 29.4)):
            Circle(CROQUIS10_R)
        with Locations((-64.286620614, 6.6)):
            Circle(CROQUIS10_R)
        with Locations((27.713379386, 29.4)):
            Circle(CROQUIS10_R)
        with Locations((27.713379386, 6.6)):
            Circle(CROQUIS10_R)
    extrude(amount=-CORTAR_EXTRUIR3_DEPTH, mode=Mode.SUBTRACT)

    # Croquis11 → Cortar-Extruir4 (cut)
    with BuildSketch(Plane.XY.offset(20)):
        with Locations((-51.286620614, 34.316010109)):
            Circle(CROQUIS11_R)
        with Locations((-51.286620614, -17.683989891)):
            Circle(CROQUIS11_R)
        with Locations((-18.286620614, -60.183989891)):
            Circle(CROQUIS11_R)
        with Locations((14.713379386, -17.683989891)):
            Circle(CROQUIS11_R)
        with Locations((14.713379386, 34.316010109)):
            Circle(CROQUIS11_R)
    extrude(amount=-CORTAR_EXTRUIR4_DEPTH, mode=Mode.SUBTRACT)


solid = part_1.part
